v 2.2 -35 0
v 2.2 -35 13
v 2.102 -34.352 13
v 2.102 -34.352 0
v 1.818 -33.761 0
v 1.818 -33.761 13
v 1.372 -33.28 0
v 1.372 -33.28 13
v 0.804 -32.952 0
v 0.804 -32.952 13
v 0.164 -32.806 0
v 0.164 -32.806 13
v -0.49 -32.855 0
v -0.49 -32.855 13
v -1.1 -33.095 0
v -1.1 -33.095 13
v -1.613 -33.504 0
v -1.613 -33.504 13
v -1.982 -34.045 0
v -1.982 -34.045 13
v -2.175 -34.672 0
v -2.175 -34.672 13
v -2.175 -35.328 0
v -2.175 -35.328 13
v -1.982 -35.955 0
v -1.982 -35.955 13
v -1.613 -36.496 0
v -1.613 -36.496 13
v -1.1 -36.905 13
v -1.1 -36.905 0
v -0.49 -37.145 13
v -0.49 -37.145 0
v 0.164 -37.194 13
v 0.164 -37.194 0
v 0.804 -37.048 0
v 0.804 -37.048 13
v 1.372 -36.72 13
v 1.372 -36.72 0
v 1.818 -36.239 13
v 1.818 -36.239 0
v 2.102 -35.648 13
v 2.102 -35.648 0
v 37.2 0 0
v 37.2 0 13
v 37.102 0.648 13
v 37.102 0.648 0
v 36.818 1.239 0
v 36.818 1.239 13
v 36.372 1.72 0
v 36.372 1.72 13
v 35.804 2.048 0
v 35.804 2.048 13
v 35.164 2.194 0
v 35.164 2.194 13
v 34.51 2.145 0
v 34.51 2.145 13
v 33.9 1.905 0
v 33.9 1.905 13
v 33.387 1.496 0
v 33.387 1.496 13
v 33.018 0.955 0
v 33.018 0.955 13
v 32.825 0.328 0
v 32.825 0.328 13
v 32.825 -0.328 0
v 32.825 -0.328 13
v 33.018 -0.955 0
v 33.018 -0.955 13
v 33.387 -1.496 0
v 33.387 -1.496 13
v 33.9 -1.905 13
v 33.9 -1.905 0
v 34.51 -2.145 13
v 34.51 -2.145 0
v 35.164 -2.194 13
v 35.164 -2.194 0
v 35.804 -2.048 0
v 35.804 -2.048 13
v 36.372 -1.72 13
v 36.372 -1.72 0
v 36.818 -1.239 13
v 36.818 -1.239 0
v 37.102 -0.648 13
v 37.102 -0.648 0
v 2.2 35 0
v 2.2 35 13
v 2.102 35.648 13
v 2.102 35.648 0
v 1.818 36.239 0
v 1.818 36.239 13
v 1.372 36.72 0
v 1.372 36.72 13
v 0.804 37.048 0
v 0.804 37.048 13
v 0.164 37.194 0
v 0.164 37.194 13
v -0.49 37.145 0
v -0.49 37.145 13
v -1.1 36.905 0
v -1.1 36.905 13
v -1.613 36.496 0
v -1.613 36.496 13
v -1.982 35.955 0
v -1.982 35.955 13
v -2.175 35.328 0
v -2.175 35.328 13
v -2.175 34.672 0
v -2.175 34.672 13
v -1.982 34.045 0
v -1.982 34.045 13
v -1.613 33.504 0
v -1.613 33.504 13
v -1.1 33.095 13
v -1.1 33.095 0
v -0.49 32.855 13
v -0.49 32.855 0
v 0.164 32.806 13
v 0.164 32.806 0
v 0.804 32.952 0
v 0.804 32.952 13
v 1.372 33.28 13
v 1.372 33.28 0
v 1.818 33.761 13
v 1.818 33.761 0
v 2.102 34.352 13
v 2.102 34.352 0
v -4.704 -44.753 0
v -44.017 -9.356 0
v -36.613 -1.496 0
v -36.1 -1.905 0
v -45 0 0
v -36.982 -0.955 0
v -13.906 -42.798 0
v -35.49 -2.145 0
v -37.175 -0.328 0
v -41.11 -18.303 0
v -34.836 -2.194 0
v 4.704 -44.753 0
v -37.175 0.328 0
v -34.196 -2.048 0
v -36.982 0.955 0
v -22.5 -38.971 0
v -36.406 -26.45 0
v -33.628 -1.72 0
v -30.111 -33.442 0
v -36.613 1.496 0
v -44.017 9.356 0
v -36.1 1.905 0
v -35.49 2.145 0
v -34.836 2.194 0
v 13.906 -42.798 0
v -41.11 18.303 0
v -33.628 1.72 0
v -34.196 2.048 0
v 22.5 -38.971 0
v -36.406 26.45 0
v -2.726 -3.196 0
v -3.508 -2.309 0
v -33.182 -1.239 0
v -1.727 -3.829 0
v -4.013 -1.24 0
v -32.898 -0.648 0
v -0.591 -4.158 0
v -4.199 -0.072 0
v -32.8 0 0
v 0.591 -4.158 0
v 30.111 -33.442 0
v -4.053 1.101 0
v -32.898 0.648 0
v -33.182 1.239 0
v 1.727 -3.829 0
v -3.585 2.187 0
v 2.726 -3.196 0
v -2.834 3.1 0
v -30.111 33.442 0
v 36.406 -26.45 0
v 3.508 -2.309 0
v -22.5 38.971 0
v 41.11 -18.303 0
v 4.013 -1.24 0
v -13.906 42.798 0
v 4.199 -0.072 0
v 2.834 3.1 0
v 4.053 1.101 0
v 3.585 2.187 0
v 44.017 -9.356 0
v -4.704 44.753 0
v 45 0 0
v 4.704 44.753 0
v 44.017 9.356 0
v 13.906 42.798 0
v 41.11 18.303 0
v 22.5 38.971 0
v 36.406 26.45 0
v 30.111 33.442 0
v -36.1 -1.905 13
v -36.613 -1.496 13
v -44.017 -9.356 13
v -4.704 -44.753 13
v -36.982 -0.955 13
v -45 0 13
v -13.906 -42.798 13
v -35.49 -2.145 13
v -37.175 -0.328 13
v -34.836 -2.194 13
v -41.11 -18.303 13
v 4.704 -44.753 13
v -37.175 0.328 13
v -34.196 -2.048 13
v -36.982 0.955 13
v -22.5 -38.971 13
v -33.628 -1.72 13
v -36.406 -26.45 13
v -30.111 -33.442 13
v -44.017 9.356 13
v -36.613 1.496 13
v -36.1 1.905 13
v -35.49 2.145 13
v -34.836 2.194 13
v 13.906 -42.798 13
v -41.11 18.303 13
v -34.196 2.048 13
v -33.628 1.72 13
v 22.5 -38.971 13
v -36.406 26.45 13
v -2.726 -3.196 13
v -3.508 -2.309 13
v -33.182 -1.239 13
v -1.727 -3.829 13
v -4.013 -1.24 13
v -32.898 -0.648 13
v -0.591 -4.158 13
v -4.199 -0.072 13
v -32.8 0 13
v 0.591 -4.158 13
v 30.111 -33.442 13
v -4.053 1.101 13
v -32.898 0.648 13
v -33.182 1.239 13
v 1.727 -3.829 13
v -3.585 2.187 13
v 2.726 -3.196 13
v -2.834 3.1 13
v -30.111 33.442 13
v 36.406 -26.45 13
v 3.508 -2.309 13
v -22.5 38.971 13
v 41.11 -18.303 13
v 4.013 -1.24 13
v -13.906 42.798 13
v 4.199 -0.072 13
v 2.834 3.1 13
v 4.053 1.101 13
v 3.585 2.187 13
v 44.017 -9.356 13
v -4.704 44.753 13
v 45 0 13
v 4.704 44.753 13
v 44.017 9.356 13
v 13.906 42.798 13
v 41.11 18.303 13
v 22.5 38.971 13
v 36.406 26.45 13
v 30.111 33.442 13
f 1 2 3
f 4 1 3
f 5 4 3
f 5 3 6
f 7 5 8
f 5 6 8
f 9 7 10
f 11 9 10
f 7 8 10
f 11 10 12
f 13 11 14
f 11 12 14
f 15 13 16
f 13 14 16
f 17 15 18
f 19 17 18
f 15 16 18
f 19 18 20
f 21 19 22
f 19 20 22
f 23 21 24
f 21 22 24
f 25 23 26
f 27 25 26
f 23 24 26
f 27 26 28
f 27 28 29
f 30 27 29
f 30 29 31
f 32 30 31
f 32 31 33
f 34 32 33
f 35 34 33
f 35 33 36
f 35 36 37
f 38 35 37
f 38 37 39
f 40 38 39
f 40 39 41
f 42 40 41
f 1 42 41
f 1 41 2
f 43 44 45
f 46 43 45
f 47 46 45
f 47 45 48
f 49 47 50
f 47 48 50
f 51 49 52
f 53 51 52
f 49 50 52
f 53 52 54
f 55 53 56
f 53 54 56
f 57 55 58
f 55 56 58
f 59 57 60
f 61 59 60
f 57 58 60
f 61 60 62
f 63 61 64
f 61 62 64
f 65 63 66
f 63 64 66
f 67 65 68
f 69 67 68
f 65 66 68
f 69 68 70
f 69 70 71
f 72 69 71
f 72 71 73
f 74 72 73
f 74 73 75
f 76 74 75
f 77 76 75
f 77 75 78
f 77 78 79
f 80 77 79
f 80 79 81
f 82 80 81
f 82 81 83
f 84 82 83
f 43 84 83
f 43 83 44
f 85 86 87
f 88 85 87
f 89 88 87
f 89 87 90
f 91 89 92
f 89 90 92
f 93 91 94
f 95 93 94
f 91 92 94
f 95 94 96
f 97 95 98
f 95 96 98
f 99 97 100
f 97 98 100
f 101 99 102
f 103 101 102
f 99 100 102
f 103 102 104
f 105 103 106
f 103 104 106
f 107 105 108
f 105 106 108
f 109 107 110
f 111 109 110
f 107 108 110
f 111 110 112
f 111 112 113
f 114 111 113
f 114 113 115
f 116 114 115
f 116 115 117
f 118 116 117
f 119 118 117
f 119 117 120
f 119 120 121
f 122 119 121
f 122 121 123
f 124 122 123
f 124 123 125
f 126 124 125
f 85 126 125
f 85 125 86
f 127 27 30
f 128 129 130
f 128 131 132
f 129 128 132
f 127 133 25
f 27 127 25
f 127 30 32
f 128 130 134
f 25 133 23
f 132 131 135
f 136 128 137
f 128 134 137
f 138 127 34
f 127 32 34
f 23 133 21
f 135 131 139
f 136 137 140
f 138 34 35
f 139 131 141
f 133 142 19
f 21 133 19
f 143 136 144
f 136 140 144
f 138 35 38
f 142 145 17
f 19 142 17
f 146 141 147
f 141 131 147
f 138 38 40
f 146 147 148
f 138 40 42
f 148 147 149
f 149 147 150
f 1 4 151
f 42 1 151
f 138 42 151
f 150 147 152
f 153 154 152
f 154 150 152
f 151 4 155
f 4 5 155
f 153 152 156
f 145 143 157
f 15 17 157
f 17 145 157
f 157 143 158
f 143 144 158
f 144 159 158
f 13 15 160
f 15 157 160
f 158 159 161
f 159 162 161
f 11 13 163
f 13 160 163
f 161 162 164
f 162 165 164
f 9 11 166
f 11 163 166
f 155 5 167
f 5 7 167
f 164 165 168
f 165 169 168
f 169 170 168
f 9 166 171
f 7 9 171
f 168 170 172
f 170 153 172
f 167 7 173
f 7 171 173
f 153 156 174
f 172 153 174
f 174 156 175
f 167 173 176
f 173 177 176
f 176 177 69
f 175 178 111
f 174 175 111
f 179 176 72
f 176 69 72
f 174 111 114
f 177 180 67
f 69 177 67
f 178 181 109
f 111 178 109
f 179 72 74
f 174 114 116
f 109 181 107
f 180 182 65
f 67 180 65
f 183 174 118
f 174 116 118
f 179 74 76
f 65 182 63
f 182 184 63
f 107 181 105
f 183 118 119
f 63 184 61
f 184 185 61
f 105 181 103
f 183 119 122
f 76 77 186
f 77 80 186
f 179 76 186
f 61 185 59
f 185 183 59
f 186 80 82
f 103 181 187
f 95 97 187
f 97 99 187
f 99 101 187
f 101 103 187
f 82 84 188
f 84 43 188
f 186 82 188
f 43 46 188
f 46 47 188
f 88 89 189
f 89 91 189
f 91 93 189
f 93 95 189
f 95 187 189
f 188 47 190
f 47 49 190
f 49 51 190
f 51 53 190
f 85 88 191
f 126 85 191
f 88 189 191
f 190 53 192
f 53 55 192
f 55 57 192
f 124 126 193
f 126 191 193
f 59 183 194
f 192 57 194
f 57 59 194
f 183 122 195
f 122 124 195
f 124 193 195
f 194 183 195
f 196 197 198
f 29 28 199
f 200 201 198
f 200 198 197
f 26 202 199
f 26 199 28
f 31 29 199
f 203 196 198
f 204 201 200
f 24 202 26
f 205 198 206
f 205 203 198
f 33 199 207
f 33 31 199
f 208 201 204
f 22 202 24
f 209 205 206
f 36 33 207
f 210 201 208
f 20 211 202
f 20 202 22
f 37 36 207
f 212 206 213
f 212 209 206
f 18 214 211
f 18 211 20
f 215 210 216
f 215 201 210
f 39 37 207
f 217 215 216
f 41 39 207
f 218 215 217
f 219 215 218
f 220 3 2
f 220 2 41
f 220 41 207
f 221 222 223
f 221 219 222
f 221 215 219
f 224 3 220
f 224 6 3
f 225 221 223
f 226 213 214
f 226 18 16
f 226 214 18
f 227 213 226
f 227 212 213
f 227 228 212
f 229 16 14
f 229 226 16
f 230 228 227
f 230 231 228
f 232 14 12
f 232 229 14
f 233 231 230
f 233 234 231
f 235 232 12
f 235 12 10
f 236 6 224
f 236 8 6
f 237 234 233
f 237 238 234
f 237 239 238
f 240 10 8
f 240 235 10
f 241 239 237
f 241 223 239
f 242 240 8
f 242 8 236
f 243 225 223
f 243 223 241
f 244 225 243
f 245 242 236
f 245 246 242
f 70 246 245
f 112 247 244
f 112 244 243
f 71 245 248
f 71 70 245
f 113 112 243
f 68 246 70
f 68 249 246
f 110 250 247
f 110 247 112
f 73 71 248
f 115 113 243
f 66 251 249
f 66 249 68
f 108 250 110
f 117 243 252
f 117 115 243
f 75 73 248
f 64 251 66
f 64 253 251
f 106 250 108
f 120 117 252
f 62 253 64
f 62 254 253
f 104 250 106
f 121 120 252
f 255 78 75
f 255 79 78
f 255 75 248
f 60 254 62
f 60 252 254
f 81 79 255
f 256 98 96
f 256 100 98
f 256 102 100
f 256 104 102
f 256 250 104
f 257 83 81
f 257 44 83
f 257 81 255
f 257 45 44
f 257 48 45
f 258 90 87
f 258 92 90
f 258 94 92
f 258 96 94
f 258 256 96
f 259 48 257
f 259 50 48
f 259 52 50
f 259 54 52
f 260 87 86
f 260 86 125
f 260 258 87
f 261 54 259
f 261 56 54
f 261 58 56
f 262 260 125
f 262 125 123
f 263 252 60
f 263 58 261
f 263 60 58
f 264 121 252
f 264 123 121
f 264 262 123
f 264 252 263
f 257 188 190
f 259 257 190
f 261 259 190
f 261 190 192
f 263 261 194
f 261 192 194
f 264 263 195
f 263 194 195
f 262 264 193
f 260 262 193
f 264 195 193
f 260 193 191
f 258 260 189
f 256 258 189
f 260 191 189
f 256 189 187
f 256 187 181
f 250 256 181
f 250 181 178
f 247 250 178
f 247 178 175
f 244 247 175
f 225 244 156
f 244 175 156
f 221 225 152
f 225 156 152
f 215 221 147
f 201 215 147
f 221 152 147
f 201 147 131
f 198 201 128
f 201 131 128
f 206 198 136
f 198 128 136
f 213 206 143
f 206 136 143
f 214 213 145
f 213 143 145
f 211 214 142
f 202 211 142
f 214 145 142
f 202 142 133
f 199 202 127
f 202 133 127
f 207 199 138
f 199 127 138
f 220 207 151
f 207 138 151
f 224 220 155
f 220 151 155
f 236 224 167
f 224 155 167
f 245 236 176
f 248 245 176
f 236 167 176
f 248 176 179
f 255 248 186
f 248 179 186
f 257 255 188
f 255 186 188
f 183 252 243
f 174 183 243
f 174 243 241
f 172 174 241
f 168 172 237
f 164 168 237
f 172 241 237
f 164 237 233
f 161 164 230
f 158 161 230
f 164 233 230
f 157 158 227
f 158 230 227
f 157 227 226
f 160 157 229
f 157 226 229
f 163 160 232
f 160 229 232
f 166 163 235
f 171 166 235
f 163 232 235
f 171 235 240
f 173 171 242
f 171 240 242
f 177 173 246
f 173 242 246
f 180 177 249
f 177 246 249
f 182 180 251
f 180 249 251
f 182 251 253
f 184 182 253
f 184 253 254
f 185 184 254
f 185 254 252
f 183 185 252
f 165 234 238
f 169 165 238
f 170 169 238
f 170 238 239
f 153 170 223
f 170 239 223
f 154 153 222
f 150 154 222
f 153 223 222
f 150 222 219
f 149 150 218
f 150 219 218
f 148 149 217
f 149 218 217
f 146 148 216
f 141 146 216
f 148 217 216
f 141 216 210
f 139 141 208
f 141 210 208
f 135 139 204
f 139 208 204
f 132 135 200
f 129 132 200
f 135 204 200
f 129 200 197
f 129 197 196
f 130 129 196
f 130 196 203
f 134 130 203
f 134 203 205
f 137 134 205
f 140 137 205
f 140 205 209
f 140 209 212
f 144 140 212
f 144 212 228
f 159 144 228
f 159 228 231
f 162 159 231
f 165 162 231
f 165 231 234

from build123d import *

# Parameters (mm, degrees)
F0_R     = 45
F1_DEPTH = 13
F3_DEPTH = 16
F4_R     = 2.2
F5_DEPTH = 14


with BuildPart() as f1:
    # F0 (on Top) → F1 (new body)
    with BuildSketch(Plane.XY):
        Circle(F0_R)
    extrude(amount=F1_DEPTH)

    # F2 (on face) → F3 (cut)
    with BuildSketch(Plane.XY.offset(13)):
        with BuildLine():
            Line((2.833725, 3.1), (-2.833725, 3.1))
            ThreePointArc((-2.833725, 3.1), (0, -4.2), (2.833725, 3.1))
        make_face()
    extrude(amount=-F3_DEPTH, mode=Mode.SUBTRACT)

    # F4 (on face) → F5 (cut)
    with BuildSketch(Plane.XY.offset(13)):
        with Locations((0, 35)):
            Circle(F4_R)
        with Locations((35, 0)):
            Circle(F4_R)
        with Locations((-35, 0)):
            Circle(F4_R)
        with Locations((0, -35)):
            Circle(F4_R)
    extrude(amount=-F5_DEPTH, mode=Mode.SUBTRACT)


solid = f1.part
